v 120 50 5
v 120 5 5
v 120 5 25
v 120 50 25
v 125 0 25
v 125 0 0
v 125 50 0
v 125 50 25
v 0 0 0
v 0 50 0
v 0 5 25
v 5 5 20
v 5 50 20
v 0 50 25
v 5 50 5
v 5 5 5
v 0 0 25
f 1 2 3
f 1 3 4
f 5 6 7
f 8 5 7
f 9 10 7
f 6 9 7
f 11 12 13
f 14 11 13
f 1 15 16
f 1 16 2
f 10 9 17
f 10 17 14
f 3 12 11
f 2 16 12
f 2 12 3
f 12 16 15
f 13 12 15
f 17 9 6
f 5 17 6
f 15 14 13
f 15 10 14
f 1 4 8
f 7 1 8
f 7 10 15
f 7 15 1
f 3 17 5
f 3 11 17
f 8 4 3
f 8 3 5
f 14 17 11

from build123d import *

# Parameters (mm, degrees)
F0_W     = 125
F0_H     = 50
F1_DEPTH = 25
F2_T     = -5
F3_SIZE  = 4.99999


# Not quite as in the source:
# - a fillet or chamfer is up to 0.001 mm smaller than in the source, because OpenCascade refuses the exact size


with BuildPart() as f1:
    # F0 (on Top) → F1 (new body)
    with BuildSketch(Plane.XY):
        with Locations((62.5, 25)):
            Rectangle(F0_W, F0_H)
    extrude(amount=F1_DEPTH)

    # F2
    f2_openings = [f1.faces().sort_by_distance(p)[0] for p in [
        (62.5, 25, 25),
        (62.5, 50, 12.5),
    ]]
    offset(amount=F2_T, openings=f2_openings)

    # F3 (size 5 in the source; OpenCascade refuses exactly that, so slightly less here)
    f3_edges = [f1.edges().sort_by_distance(p)[0] for p in [
        (5, 27.5, 25),
    ]]
    chamfer(f3_edges, length=F3_SIZE)


solid = f1.part
